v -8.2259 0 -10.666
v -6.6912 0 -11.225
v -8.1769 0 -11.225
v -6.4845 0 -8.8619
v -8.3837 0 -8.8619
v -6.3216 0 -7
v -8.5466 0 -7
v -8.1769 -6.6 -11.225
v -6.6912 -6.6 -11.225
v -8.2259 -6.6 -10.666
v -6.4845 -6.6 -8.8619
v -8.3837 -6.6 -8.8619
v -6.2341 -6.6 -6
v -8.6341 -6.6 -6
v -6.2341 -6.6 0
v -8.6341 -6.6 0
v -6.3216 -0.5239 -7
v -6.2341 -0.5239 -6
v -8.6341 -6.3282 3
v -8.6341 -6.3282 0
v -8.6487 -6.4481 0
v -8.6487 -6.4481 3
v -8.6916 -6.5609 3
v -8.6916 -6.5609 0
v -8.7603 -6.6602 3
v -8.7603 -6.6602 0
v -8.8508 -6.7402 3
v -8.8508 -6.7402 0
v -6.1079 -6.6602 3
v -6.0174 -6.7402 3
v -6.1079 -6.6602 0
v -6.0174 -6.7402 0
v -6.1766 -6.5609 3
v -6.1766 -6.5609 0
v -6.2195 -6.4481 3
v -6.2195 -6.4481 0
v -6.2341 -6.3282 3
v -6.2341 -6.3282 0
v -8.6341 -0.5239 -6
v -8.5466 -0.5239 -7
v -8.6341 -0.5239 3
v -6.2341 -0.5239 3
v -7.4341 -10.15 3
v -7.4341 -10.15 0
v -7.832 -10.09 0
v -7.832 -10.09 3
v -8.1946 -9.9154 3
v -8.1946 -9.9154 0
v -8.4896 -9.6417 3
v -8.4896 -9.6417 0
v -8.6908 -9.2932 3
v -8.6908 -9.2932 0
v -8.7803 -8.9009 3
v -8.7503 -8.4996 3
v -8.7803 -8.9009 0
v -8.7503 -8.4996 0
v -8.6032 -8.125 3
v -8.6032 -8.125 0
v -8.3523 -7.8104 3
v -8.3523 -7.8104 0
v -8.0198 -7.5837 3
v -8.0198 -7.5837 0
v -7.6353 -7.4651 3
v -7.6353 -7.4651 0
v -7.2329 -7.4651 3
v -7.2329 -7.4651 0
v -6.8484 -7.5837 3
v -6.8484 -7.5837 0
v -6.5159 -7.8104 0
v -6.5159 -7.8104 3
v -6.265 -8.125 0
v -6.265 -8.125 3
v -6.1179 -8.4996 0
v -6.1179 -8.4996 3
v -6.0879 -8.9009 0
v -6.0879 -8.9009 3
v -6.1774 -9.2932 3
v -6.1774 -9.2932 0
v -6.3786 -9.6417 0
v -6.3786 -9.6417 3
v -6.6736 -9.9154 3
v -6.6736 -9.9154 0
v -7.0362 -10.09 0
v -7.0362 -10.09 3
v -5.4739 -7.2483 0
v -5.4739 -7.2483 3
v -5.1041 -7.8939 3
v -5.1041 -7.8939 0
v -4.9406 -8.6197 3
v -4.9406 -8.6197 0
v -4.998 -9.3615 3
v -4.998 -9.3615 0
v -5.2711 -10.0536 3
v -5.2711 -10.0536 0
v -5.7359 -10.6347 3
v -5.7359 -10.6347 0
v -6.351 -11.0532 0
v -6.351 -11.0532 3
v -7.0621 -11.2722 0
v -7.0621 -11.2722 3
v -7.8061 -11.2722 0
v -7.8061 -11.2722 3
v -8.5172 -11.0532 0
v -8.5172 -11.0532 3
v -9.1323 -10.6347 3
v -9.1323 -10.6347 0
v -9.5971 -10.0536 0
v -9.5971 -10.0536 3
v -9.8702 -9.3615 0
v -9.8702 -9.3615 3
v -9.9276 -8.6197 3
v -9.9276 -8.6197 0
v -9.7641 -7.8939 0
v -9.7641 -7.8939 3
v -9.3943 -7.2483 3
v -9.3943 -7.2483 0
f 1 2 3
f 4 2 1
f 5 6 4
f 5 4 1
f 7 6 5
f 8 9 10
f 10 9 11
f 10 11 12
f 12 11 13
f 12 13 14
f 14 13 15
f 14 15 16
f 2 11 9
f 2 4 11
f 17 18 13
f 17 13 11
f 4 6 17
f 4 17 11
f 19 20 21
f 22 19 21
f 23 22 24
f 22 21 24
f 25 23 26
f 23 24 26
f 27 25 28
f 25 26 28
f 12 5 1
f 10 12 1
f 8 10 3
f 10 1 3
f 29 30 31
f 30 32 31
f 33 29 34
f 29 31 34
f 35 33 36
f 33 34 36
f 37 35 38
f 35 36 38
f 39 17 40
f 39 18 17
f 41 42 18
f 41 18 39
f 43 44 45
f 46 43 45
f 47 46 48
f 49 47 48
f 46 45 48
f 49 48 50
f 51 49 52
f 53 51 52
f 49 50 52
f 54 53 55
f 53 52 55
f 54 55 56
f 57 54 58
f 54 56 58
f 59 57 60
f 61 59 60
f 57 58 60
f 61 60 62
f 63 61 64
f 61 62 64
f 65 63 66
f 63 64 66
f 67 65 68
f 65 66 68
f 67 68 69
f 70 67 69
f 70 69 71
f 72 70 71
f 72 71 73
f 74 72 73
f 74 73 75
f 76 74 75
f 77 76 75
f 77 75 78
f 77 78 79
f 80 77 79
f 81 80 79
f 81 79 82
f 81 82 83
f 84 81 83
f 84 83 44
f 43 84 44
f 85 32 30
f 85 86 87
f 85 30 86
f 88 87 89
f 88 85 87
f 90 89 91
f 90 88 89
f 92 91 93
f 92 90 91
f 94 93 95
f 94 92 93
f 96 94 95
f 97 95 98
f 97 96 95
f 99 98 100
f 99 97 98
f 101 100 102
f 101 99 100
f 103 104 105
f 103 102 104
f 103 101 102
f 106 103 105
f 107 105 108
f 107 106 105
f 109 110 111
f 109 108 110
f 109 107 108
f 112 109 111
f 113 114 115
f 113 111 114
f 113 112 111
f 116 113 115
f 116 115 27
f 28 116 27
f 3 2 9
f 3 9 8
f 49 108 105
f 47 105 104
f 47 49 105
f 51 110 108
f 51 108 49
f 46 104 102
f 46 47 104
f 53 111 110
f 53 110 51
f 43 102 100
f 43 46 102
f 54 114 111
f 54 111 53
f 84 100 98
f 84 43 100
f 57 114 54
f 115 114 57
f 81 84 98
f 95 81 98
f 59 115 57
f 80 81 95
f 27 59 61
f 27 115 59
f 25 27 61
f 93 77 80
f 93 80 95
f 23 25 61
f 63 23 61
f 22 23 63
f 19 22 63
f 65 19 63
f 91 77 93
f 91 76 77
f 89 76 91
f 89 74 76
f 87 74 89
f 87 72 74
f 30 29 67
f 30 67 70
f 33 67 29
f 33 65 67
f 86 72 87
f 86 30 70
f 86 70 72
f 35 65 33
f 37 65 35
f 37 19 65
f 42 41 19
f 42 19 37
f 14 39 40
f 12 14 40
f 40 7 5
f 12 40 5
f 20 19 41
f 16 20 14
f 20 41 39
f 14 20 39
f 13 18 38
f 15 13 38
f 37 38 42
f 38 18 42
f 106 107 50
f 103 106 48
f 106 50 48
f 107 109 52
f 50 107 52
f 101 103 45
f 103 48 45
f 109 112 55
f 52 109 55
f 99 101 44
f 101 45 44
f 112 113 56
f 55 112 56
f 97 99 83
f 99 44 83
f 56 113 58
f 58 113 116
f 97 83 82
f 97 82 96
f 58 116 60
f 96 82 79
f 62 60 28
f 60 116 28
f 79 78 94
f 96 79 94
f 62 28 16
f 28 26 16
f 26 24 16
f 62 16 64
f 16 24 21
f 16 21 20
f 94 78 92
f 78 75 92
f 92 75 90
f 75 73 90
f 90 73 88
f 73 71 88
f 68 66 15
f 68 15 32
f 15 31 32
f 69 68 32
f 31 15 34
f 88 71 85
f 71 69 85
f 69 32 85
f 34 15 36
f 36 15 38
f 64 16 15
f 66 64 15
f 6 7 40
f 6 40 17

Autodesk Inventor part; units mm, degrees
ref_plane "YZ Plane" through (0, 0, 0) normal (1, 0, 0) x (0, 1, 0)
ref_plane "XZ Plane" through (0, 0, 0) normal (0, 1, 0) x (-1, 0, 0)
sketch "Sketch1" plane through (0, 0, 0) normal (0, 1, 0) x (-1, 0, 0)
  line L0 (5.5341, -4.8619) -> (4.7341, -5.0029) projected
  line L1 (5.5341, -4.4619) -> (5.5341, -4.8619) projected
  line L2 (4.7341, -4) -> (5.5341, -4.4619) projected
  line L3 (4.7341, -3.0029) -> (4.7341, -4) projected
  line L4 (5.5341, -2.8619) -> (4.7341, -3.0029) projected
  line L5 (5.5341, -2.4619) -> (5.5341, -2.8619) projected
  line L6 (4.7341, -2) -> (5.5341, -2.4619) projected
  line L7 (4.7341, -1.0029) -> (4.7341, -2) projected
  line L8 (5.5341, -0.8619) -> (4.7341, -1.0029) projected
  line L9 (5.5341, -0.4619) -> (5.5341, -0.8619) projected
  line L10 (4.7341, 0) -> (5.5341, -0.4619) projected
  line L11 (10.1341, 0) -> (4.7341, 0) projected
  line L12 (9.3341, -0.4619) -> (10.1341, 0) projected
  line L13 (9.3341, -0.8619) -> (9.3341, -0.4619) projected
  line L14 (10.1341, -1.0029) -> (9.3341, -0.8619) projected
  line L15 (10.1341, -1.0029) -> (10.1341, -2) projected
  line L16 (9.3341, -2.4619) -> (10.1341, -2) projected
  line L17 (9.3341, -2.8619) -> (9.3341, -2.4619) projected
  line L18 (10.1341, -3.0029) -> (9.3341, -2.8619) projected
  line L19 (10.1341, -3.0029) -> (10.1341, -4) projected
  line L20 (9.3341, -4.4619) -> (10.1341, -4) projected
  line L21 (9.3341, -4.8619) -> (9.3341, -4.4619) projected
  line L22 (10.1341, -5.0029) -> (9.3341, -4.8619) projected
  line L23 (10.1341, -5.0029) -> (10.1341, -6) projected
  line L24 (9.3341, -6.4619) -> (10.1341, -6) projected
  line L25 (9.3341, -6.8619) -> (9.3341, -6.4619) projected
  line L26 (10.1341, -7.0029) -> (9.3341, -6.8619) projected
  line L27 (10.1341, -7.0029) -> (10.1341, -8) projected
  line L28 (9.3341, -8.4619) -> (10.1341, -8) projected
  line L29 (9.3341, -8.8619) -> (9.3341, -8.4619) projected
  line L30 (10.1336, -9.0029) -> (9.3341, -8.8619) projected
  line L31 (10.1341, -9) -> (10.1341, -10.8672) projected
  arc A0 (10.1341, -10.8672) -> (10.1663, -11.225) centre (12.1341, -10.8672) ccw projected
  line L32 (4.5189, -11.225) -> (10.1663, -11.225) projected
  arc A1 (4.5189, -11.225) -> (4.7341, -10.3226) centre (2.7341, -10.3226) ccw projected
  line L33 (4.7341, -9) -> (4.7341, -10.3226) projected
  line L34 (5.5341, -8.8619) -> (4.7346, -9.0029) projected
  line L35 (5.5341, -8.4619) -> (5.5341, -8.8619) projected
  line L36 (4.7341, -8) -> (5.5341, -8.4619) projected
  line L37 (4.7341, -7.0029) -> (4.7341, -8) projected
  line L38 (5.5341, -6.8619) -> (4.7341, -7.0029) projected
  line L39 (5.5341, -6.4619) -> (5.5341, -6.8619) projected
  line L40 (4.7341, -6) -> (5.5341, -6.4619) projected
  line L41 (4.7341, -5.0029) -> (4.7341, -6) projected
  line L42 (10.1341, 0) -> (8.6341, 0)
  line L43 (4.7341, 0) -> (6.2341, 0)
  line L44 (6.2341, 0) -> (6.2341, -6)
  line L45 (6.2341, -6) -> (8.6341, -6)
  line L46 (8.6341, -6) -> (8.6341, 0)
  line L47 (8.6341, -6) -> (8.3837, -8.8619)
  line L48 (8.6341, -6) -> (11.5069, -6) construction
  line L49 (6.2341, -6) -> (6.4845, -8.8619)
  line L50 (6.2341, -6) -> (9.1069, -6) construction
  line L51 (6.4845, -8.8619) -> (8.3837, -8.8619)
  line L52 (8.3837, -8.8619) -> (8.2259, -10.666)
  line L53 (8.2259, -10.666) -> (8.1769, -11.225)
  line L54 (6.4845, -8.8619) -> (6.6912, -11.225)
  line L55 (8.6341, 0) -> (6.2341, 0)
  line L56 (6.2341, 0) -> (6.2341, 2)
  line L57 (6.2341, 2) -> (8.6341, 2)
  line L58 (8.6341, 2) -> (8.6341, 0)
  point P0 (0, 0)
  dimension "d0" = 1.5
  dimension "d1" = 1.5
  dimension "d2" = 6
  dimension "d3" = 95
  dimension "d4" = 85
  dimension "d5" = 2
extrude "Extrusion1" add sketch "Sketch1" against normal blind 6.6 contours L56 L57 L58 L11 | L11 L46 L45 L44 | L54 L51 L52 L53 L32 | L45 L47 L51 L49
sketch "Sketch2" plane through (-8.6341, 0, 2) normal (0, 0, 1) x (1, 0, 0)
  circle A0 centre (1.2, 2) radius 0.9
  circle A1 centre (1.2, -8.8) radius 0.9
  circle A2 centre (1.2, 2) radius 2.5
  circle A3 centre (1.2, -8.8) radius 2.5
  line L0 (0, 0) -> (2.4, 0) projected
  line L1 (0, 0) -> (0, -6.6) projected
  line L2 (2.4, -6.6) -> (0, -6.6) projected
  line L3 (2.4, 0) -> (2.4, -6.6) projected
  line L4 (2.4, 0) -> (2.4, -6.6) projected
  line L5 (2.4, -6.6) -> (2.4, -6.4)
  line L6 (2.4, -6.4) -> (2.4, -6.087)
  line L7 (0, -6.4) -> (0, -6.0348)
  circle A4 centre (2.9, -6.3282) radius 0.5
  circle A5 centre (-0.5, -6.3282) radius 0.5
  line L8 (0, 0) -> (0, -6.6) projected
  circle A6 centre (1.2, -8.8) radius 1.1 projected
  circle A7 centre (1.2, 2) radius 1.1 projected
  line L9 (3.9, 0.2) -> (3.9, -6.8) projected
  line L10 (3.9, -6.8) -> (-1.5, -6.8) projected
  line L11 (-1.5, -6.8) -> (-1.5, 0.2) projected
  line L12 (-1.5, 0.2) -> (3.9, 0.2) projected
  line L13 (-8, -25.631) -> (-8, 3.869) projected
  line L14 (8.6341, -25.631) -> (-8, -25.631) projected
  line L15 (8.6341, -25.631) -> (8.6341, 3.869) projected
  line L16 (-8, 3.869) -> (8.6341, 3.869) projected
  point P0 (8.6341, 0)
  point P1 (0, -6.3282)
  point P2 (-0.2167, -6.7401)
  point P3 (2.6167, -6.7401)
  point P4 (2.4, -6.3282)
  point P5 (2.4, -0.1932)
  point P6 (0, -0.1932)
  dimension "d16" = 5
  dimension "d17" = 5
  dimension "d19" = 0.2
  dimension "d20" = 1
  dimension "d21" = 1
ref_plane "Work Plane1" through (-16.6341, -25.631, 0) normal (0, 0, 1) x (1, 0, 0)
extrude "Extrusion3" add sketch "Sketch2" along normal blind 1 and the other way blind 2 contours A0 | A1 | A2 L12 L16 | L16 A2 | A2 L3 L0 L1 L12 | L3 L2 A3 L1 A2 | A2 L1 L0 L3 | A4 A3 L2 L3 | L1 L2 A3 A5 | A3 L10 L2 | A3 L10 | L2 A3 | A6 | A7
sketch "Sketch3" plane through (-8.6341, 0, 3) normal (0, 0, 1) x (1, 0, 0)
  circle A0 centre (1.2, -8.8) radius 0.9 projected
  circle A1 centre (1.2, 2) radius 0.9 projected
  point P0 (8.6341, 0)
fillet "Fillet1" radius 0.6 1 edges at (-6.2341, -0.1932, 1.5)
hole "Hole1" at (-7.4341, -8.8, 3) at (-7.4341, 2, 3) direction (0, 0, -1) diameter 2.7 end through all clearance for "Countersunk Flat Head Screw ISO 2009/7046" size "M2.5" standard "ISO"
sketch "Sketch4" plane through (-8.6341, 0, 3) normal (0, 0, 1) x (1, 0, 0)
  arc A0 (2.6516, -0.0354) -> (2.4, -0.5239) centre (3, -0.5239) ccw projected
  line L0 (3, -0.5239) -> (-1.7059, -0.5239)
  line L1 (-1.7059, -0.5239) -> (-1.7059, 4.8856)
  line L2 (-1.7059, 4.8856) -> (3, 4.8856)
  line L3 (3, 4.8856) -> (3, -0.5239)
  line L4 (3, -0.5239) -> (6.6824, -0.5239)
  line L5 (6.6824, -0.5239) -> (6.6824, 3.9617)
  line L6 (6.6824, 3.9617) -> (3, 3.9617)
  line L7 (3, 3.9617) -> (3, -0.5239)
  point P0 (8.6341, 0)
extrude "Extrusion4" cut sketch "Sketch4" against normal blind 10
properties part number "belt clip 2"
